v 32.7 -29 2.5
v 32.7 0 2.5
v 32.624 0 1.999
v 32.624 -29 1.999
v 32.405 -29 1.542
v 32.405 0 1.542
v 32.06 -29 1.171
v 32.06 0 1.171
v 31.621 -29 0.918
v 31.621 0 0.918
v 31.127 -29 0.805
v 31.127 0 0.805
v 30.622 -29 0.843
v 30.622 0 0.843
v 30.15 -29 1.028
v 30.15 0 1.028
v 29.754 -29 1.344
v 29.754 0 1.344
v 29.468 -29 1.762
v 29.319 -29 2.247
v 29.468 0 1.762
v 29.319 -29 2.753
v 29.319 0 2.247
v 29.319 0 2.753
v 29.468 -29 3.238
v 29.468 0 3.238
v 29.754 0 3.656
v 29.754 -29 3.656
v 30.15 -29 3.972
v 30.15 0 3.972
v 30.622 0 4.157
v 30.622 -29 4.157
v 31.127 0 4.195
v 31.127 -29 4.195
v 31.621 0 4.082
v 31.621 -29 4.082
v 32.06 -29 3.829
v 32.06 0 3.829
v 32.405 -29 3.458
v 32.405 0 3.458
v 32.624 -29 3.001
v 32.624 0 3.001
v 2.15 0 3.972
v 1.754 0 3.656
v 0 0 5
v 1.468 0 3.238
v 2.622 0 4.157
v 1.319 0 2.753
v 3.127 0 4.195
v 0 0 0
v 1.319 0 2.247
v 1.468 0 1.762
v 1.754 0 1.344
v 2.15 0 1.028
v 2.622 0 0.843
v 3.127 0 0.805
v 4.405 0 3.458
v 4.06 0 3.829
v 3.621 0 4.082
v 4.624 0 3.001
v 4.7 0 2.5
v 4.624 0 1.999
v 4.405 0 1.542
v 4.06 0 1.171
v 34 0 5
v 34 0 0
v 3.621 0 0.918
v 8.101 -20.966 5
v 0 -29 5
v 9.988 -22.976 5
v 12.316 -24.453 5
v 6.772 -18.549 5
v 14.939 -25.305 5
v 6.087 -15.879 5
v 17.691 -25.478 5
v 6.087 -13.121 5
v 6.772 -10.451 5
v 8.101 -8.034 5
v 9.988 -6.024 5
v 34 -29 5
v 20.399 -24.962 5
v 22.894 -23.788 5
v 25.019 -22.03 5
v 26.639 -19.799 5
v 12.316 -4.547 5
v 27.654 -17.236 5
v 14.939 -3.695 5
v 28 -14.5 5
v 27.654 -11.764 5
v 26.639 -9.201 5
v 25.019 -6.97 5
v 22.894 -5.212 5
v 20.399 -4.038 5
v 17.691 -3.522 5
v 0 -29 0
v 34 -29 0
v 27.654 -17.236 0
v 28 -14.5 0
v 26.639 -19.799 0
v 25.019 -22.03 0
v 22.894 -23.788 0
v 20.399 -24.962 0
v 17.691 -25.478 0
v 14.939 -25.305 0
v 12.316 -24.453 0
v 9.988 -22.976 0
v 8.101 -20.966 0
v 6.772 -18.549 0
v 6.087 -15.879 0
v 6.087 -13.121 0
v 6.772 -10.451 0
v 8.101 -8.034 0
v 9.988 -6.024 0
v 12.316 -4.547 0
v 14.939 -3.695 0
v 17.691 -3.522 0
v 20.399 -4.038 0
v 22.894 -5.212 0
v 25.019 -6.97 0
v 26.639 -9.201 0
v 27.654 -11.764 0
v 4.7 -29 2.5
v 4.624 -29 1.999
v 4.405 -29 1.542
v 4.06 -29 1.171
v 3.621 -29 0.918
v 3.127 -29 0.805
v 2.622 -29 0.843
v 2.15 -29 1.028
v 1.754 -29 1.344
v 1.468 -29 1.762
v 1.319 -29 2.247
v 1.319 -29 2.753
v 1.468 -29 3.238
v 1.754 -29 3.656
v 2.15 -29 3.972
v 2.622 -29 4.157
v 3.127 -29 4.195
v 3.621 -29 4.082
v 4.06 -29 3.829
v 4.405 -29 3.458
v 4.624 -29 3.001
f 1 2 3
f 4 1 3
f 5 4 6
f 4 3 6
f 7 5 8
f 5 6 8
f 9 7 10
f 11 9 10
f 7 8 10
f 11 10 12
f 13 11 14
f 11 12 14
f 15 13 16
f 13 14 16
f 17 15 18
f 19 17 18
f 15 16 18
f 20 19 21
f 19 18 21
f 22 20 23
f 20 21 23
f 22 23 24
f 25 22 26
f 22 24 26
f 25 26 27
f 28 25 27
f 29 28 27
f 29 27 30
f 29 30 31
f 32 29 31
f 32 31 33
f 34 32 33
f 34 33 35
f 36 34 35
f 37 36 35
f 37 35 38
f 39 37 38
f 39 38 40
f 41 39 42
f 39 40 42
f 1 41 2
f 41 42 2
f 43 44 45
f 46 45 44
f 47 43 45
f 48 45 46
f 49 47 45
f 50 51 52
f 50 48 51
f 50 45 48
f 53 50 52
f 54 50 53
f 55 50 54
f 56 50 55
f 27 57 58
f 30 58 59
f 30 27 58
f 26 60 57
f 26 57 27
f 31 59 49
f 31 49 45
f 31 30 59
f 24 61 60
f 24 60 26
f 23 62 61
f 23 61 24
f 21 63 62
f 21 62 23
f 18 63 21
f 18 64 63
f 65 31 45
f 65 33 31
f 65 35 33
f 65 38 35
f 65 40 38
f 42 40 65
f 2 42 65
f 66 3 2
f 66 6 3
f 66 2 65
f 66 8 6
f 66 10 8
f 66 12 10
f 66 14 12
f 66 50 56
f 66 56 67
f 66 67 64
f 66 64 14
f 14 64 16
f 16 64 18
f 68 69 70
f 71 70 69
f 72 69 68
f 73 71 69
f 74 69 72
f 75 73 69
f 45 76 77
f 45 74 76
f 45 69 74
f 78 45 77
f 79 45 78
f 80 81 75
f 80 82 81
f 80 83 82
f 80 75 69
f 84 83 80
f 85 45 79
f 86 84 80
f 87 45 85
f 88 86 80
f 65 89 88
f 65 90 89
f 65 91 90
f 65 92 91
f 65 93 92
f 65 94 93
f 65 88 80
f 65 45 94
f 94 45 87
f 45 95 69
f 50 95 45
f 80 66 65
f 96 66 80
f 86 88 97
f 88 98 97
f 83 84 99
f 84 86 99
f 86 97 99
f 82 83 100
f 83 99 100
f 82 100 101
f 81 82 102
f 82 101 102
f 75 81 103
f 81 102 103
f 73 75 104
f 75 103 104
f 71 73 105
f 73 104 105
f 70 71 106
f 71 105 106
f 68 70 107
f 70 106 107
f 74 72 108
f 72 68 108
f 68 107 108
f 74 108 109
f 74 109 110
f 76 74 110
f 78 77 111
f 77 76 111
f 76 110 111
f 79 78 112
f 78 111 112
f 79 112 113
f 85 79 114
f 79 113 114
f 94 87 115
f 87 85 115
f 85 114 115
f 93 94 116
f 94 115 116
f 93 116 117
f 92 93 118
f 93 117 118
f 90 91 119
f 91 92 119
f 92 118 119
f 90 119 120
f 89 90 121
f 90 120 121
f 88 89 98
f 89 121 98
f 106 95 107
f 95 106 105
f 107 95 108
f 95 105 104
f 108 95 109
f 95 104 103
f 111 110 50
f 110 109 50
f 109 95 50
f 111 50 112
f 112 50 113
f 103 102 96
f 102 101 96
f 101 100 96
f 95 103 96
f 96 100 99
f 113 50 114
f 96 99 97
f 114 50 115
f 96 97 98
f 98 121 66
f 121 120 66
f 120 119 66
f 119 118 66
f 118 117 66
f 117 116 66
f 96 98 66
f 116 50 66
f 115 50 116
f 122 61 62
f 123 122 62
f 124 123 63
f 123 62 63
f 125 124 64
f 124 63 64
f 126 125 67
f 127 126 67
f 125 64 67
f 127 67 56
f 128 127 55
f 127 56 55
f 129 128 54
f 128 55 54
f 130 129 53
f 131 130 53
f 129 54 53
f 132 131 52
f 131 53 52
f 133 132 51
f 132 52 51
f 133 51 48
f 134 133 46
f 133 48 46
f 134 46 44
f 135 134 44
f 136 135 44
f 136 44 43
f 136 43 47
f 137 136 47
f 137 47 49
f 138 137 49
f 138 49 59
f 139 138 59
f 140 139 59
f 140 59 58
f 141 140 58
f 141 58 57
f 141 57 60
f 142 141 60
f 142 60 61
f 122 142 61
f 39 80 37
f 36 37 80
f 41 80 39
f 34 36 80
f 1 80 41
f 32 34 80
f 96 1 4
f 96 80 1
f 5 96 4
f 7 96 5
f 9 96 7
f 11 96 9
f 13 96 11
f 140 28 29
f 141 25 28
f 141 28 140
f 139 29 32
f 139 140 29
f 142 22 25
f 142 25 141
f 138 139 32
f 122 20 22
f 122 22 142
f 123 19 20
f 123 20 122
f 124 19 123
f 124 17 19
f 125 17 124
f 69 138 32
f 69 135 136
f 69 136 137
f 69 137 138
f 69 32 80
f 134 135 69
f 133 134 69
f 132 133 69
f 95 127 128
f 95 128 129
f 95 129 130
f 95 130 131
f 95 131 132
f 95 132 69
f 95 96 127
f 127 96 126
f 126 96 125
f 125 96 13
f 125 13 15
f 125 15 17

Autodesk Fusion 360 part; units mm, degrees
sketch "Sketch1" plane through (0, 0, 0) normal (0, 0, 1) x (1, 0, 0)
  line L0 (0, 0) -> (34, 0)
  line L1 (34, 0) -> (34, -29)
  line L2 (34, -29) -> (0, -29)
  line L3 (0, -29) -> (0, 0)
  circle A0 centre (17, -14.5) radius 11
  dimension "d1" = 34
  dimension "d2" = 29
  dimension "d3" = 22
extrude "Extrude1" add sketch "Sketch1" along normal blind 5
sketch "Sketch2" plane through (0, 0, 0) normal (0, 1, 0) x (1, 0, 0)
  circle A0 centre (3, -2.5) radius 1.7
  circle A1 centre (31, -2.5) radius 1.7
  dimension "d6" = 3.4
  dimension "d7" = 3.4
extrude "Extrude2" cut sketch "Sketch2" against normal blind 29
